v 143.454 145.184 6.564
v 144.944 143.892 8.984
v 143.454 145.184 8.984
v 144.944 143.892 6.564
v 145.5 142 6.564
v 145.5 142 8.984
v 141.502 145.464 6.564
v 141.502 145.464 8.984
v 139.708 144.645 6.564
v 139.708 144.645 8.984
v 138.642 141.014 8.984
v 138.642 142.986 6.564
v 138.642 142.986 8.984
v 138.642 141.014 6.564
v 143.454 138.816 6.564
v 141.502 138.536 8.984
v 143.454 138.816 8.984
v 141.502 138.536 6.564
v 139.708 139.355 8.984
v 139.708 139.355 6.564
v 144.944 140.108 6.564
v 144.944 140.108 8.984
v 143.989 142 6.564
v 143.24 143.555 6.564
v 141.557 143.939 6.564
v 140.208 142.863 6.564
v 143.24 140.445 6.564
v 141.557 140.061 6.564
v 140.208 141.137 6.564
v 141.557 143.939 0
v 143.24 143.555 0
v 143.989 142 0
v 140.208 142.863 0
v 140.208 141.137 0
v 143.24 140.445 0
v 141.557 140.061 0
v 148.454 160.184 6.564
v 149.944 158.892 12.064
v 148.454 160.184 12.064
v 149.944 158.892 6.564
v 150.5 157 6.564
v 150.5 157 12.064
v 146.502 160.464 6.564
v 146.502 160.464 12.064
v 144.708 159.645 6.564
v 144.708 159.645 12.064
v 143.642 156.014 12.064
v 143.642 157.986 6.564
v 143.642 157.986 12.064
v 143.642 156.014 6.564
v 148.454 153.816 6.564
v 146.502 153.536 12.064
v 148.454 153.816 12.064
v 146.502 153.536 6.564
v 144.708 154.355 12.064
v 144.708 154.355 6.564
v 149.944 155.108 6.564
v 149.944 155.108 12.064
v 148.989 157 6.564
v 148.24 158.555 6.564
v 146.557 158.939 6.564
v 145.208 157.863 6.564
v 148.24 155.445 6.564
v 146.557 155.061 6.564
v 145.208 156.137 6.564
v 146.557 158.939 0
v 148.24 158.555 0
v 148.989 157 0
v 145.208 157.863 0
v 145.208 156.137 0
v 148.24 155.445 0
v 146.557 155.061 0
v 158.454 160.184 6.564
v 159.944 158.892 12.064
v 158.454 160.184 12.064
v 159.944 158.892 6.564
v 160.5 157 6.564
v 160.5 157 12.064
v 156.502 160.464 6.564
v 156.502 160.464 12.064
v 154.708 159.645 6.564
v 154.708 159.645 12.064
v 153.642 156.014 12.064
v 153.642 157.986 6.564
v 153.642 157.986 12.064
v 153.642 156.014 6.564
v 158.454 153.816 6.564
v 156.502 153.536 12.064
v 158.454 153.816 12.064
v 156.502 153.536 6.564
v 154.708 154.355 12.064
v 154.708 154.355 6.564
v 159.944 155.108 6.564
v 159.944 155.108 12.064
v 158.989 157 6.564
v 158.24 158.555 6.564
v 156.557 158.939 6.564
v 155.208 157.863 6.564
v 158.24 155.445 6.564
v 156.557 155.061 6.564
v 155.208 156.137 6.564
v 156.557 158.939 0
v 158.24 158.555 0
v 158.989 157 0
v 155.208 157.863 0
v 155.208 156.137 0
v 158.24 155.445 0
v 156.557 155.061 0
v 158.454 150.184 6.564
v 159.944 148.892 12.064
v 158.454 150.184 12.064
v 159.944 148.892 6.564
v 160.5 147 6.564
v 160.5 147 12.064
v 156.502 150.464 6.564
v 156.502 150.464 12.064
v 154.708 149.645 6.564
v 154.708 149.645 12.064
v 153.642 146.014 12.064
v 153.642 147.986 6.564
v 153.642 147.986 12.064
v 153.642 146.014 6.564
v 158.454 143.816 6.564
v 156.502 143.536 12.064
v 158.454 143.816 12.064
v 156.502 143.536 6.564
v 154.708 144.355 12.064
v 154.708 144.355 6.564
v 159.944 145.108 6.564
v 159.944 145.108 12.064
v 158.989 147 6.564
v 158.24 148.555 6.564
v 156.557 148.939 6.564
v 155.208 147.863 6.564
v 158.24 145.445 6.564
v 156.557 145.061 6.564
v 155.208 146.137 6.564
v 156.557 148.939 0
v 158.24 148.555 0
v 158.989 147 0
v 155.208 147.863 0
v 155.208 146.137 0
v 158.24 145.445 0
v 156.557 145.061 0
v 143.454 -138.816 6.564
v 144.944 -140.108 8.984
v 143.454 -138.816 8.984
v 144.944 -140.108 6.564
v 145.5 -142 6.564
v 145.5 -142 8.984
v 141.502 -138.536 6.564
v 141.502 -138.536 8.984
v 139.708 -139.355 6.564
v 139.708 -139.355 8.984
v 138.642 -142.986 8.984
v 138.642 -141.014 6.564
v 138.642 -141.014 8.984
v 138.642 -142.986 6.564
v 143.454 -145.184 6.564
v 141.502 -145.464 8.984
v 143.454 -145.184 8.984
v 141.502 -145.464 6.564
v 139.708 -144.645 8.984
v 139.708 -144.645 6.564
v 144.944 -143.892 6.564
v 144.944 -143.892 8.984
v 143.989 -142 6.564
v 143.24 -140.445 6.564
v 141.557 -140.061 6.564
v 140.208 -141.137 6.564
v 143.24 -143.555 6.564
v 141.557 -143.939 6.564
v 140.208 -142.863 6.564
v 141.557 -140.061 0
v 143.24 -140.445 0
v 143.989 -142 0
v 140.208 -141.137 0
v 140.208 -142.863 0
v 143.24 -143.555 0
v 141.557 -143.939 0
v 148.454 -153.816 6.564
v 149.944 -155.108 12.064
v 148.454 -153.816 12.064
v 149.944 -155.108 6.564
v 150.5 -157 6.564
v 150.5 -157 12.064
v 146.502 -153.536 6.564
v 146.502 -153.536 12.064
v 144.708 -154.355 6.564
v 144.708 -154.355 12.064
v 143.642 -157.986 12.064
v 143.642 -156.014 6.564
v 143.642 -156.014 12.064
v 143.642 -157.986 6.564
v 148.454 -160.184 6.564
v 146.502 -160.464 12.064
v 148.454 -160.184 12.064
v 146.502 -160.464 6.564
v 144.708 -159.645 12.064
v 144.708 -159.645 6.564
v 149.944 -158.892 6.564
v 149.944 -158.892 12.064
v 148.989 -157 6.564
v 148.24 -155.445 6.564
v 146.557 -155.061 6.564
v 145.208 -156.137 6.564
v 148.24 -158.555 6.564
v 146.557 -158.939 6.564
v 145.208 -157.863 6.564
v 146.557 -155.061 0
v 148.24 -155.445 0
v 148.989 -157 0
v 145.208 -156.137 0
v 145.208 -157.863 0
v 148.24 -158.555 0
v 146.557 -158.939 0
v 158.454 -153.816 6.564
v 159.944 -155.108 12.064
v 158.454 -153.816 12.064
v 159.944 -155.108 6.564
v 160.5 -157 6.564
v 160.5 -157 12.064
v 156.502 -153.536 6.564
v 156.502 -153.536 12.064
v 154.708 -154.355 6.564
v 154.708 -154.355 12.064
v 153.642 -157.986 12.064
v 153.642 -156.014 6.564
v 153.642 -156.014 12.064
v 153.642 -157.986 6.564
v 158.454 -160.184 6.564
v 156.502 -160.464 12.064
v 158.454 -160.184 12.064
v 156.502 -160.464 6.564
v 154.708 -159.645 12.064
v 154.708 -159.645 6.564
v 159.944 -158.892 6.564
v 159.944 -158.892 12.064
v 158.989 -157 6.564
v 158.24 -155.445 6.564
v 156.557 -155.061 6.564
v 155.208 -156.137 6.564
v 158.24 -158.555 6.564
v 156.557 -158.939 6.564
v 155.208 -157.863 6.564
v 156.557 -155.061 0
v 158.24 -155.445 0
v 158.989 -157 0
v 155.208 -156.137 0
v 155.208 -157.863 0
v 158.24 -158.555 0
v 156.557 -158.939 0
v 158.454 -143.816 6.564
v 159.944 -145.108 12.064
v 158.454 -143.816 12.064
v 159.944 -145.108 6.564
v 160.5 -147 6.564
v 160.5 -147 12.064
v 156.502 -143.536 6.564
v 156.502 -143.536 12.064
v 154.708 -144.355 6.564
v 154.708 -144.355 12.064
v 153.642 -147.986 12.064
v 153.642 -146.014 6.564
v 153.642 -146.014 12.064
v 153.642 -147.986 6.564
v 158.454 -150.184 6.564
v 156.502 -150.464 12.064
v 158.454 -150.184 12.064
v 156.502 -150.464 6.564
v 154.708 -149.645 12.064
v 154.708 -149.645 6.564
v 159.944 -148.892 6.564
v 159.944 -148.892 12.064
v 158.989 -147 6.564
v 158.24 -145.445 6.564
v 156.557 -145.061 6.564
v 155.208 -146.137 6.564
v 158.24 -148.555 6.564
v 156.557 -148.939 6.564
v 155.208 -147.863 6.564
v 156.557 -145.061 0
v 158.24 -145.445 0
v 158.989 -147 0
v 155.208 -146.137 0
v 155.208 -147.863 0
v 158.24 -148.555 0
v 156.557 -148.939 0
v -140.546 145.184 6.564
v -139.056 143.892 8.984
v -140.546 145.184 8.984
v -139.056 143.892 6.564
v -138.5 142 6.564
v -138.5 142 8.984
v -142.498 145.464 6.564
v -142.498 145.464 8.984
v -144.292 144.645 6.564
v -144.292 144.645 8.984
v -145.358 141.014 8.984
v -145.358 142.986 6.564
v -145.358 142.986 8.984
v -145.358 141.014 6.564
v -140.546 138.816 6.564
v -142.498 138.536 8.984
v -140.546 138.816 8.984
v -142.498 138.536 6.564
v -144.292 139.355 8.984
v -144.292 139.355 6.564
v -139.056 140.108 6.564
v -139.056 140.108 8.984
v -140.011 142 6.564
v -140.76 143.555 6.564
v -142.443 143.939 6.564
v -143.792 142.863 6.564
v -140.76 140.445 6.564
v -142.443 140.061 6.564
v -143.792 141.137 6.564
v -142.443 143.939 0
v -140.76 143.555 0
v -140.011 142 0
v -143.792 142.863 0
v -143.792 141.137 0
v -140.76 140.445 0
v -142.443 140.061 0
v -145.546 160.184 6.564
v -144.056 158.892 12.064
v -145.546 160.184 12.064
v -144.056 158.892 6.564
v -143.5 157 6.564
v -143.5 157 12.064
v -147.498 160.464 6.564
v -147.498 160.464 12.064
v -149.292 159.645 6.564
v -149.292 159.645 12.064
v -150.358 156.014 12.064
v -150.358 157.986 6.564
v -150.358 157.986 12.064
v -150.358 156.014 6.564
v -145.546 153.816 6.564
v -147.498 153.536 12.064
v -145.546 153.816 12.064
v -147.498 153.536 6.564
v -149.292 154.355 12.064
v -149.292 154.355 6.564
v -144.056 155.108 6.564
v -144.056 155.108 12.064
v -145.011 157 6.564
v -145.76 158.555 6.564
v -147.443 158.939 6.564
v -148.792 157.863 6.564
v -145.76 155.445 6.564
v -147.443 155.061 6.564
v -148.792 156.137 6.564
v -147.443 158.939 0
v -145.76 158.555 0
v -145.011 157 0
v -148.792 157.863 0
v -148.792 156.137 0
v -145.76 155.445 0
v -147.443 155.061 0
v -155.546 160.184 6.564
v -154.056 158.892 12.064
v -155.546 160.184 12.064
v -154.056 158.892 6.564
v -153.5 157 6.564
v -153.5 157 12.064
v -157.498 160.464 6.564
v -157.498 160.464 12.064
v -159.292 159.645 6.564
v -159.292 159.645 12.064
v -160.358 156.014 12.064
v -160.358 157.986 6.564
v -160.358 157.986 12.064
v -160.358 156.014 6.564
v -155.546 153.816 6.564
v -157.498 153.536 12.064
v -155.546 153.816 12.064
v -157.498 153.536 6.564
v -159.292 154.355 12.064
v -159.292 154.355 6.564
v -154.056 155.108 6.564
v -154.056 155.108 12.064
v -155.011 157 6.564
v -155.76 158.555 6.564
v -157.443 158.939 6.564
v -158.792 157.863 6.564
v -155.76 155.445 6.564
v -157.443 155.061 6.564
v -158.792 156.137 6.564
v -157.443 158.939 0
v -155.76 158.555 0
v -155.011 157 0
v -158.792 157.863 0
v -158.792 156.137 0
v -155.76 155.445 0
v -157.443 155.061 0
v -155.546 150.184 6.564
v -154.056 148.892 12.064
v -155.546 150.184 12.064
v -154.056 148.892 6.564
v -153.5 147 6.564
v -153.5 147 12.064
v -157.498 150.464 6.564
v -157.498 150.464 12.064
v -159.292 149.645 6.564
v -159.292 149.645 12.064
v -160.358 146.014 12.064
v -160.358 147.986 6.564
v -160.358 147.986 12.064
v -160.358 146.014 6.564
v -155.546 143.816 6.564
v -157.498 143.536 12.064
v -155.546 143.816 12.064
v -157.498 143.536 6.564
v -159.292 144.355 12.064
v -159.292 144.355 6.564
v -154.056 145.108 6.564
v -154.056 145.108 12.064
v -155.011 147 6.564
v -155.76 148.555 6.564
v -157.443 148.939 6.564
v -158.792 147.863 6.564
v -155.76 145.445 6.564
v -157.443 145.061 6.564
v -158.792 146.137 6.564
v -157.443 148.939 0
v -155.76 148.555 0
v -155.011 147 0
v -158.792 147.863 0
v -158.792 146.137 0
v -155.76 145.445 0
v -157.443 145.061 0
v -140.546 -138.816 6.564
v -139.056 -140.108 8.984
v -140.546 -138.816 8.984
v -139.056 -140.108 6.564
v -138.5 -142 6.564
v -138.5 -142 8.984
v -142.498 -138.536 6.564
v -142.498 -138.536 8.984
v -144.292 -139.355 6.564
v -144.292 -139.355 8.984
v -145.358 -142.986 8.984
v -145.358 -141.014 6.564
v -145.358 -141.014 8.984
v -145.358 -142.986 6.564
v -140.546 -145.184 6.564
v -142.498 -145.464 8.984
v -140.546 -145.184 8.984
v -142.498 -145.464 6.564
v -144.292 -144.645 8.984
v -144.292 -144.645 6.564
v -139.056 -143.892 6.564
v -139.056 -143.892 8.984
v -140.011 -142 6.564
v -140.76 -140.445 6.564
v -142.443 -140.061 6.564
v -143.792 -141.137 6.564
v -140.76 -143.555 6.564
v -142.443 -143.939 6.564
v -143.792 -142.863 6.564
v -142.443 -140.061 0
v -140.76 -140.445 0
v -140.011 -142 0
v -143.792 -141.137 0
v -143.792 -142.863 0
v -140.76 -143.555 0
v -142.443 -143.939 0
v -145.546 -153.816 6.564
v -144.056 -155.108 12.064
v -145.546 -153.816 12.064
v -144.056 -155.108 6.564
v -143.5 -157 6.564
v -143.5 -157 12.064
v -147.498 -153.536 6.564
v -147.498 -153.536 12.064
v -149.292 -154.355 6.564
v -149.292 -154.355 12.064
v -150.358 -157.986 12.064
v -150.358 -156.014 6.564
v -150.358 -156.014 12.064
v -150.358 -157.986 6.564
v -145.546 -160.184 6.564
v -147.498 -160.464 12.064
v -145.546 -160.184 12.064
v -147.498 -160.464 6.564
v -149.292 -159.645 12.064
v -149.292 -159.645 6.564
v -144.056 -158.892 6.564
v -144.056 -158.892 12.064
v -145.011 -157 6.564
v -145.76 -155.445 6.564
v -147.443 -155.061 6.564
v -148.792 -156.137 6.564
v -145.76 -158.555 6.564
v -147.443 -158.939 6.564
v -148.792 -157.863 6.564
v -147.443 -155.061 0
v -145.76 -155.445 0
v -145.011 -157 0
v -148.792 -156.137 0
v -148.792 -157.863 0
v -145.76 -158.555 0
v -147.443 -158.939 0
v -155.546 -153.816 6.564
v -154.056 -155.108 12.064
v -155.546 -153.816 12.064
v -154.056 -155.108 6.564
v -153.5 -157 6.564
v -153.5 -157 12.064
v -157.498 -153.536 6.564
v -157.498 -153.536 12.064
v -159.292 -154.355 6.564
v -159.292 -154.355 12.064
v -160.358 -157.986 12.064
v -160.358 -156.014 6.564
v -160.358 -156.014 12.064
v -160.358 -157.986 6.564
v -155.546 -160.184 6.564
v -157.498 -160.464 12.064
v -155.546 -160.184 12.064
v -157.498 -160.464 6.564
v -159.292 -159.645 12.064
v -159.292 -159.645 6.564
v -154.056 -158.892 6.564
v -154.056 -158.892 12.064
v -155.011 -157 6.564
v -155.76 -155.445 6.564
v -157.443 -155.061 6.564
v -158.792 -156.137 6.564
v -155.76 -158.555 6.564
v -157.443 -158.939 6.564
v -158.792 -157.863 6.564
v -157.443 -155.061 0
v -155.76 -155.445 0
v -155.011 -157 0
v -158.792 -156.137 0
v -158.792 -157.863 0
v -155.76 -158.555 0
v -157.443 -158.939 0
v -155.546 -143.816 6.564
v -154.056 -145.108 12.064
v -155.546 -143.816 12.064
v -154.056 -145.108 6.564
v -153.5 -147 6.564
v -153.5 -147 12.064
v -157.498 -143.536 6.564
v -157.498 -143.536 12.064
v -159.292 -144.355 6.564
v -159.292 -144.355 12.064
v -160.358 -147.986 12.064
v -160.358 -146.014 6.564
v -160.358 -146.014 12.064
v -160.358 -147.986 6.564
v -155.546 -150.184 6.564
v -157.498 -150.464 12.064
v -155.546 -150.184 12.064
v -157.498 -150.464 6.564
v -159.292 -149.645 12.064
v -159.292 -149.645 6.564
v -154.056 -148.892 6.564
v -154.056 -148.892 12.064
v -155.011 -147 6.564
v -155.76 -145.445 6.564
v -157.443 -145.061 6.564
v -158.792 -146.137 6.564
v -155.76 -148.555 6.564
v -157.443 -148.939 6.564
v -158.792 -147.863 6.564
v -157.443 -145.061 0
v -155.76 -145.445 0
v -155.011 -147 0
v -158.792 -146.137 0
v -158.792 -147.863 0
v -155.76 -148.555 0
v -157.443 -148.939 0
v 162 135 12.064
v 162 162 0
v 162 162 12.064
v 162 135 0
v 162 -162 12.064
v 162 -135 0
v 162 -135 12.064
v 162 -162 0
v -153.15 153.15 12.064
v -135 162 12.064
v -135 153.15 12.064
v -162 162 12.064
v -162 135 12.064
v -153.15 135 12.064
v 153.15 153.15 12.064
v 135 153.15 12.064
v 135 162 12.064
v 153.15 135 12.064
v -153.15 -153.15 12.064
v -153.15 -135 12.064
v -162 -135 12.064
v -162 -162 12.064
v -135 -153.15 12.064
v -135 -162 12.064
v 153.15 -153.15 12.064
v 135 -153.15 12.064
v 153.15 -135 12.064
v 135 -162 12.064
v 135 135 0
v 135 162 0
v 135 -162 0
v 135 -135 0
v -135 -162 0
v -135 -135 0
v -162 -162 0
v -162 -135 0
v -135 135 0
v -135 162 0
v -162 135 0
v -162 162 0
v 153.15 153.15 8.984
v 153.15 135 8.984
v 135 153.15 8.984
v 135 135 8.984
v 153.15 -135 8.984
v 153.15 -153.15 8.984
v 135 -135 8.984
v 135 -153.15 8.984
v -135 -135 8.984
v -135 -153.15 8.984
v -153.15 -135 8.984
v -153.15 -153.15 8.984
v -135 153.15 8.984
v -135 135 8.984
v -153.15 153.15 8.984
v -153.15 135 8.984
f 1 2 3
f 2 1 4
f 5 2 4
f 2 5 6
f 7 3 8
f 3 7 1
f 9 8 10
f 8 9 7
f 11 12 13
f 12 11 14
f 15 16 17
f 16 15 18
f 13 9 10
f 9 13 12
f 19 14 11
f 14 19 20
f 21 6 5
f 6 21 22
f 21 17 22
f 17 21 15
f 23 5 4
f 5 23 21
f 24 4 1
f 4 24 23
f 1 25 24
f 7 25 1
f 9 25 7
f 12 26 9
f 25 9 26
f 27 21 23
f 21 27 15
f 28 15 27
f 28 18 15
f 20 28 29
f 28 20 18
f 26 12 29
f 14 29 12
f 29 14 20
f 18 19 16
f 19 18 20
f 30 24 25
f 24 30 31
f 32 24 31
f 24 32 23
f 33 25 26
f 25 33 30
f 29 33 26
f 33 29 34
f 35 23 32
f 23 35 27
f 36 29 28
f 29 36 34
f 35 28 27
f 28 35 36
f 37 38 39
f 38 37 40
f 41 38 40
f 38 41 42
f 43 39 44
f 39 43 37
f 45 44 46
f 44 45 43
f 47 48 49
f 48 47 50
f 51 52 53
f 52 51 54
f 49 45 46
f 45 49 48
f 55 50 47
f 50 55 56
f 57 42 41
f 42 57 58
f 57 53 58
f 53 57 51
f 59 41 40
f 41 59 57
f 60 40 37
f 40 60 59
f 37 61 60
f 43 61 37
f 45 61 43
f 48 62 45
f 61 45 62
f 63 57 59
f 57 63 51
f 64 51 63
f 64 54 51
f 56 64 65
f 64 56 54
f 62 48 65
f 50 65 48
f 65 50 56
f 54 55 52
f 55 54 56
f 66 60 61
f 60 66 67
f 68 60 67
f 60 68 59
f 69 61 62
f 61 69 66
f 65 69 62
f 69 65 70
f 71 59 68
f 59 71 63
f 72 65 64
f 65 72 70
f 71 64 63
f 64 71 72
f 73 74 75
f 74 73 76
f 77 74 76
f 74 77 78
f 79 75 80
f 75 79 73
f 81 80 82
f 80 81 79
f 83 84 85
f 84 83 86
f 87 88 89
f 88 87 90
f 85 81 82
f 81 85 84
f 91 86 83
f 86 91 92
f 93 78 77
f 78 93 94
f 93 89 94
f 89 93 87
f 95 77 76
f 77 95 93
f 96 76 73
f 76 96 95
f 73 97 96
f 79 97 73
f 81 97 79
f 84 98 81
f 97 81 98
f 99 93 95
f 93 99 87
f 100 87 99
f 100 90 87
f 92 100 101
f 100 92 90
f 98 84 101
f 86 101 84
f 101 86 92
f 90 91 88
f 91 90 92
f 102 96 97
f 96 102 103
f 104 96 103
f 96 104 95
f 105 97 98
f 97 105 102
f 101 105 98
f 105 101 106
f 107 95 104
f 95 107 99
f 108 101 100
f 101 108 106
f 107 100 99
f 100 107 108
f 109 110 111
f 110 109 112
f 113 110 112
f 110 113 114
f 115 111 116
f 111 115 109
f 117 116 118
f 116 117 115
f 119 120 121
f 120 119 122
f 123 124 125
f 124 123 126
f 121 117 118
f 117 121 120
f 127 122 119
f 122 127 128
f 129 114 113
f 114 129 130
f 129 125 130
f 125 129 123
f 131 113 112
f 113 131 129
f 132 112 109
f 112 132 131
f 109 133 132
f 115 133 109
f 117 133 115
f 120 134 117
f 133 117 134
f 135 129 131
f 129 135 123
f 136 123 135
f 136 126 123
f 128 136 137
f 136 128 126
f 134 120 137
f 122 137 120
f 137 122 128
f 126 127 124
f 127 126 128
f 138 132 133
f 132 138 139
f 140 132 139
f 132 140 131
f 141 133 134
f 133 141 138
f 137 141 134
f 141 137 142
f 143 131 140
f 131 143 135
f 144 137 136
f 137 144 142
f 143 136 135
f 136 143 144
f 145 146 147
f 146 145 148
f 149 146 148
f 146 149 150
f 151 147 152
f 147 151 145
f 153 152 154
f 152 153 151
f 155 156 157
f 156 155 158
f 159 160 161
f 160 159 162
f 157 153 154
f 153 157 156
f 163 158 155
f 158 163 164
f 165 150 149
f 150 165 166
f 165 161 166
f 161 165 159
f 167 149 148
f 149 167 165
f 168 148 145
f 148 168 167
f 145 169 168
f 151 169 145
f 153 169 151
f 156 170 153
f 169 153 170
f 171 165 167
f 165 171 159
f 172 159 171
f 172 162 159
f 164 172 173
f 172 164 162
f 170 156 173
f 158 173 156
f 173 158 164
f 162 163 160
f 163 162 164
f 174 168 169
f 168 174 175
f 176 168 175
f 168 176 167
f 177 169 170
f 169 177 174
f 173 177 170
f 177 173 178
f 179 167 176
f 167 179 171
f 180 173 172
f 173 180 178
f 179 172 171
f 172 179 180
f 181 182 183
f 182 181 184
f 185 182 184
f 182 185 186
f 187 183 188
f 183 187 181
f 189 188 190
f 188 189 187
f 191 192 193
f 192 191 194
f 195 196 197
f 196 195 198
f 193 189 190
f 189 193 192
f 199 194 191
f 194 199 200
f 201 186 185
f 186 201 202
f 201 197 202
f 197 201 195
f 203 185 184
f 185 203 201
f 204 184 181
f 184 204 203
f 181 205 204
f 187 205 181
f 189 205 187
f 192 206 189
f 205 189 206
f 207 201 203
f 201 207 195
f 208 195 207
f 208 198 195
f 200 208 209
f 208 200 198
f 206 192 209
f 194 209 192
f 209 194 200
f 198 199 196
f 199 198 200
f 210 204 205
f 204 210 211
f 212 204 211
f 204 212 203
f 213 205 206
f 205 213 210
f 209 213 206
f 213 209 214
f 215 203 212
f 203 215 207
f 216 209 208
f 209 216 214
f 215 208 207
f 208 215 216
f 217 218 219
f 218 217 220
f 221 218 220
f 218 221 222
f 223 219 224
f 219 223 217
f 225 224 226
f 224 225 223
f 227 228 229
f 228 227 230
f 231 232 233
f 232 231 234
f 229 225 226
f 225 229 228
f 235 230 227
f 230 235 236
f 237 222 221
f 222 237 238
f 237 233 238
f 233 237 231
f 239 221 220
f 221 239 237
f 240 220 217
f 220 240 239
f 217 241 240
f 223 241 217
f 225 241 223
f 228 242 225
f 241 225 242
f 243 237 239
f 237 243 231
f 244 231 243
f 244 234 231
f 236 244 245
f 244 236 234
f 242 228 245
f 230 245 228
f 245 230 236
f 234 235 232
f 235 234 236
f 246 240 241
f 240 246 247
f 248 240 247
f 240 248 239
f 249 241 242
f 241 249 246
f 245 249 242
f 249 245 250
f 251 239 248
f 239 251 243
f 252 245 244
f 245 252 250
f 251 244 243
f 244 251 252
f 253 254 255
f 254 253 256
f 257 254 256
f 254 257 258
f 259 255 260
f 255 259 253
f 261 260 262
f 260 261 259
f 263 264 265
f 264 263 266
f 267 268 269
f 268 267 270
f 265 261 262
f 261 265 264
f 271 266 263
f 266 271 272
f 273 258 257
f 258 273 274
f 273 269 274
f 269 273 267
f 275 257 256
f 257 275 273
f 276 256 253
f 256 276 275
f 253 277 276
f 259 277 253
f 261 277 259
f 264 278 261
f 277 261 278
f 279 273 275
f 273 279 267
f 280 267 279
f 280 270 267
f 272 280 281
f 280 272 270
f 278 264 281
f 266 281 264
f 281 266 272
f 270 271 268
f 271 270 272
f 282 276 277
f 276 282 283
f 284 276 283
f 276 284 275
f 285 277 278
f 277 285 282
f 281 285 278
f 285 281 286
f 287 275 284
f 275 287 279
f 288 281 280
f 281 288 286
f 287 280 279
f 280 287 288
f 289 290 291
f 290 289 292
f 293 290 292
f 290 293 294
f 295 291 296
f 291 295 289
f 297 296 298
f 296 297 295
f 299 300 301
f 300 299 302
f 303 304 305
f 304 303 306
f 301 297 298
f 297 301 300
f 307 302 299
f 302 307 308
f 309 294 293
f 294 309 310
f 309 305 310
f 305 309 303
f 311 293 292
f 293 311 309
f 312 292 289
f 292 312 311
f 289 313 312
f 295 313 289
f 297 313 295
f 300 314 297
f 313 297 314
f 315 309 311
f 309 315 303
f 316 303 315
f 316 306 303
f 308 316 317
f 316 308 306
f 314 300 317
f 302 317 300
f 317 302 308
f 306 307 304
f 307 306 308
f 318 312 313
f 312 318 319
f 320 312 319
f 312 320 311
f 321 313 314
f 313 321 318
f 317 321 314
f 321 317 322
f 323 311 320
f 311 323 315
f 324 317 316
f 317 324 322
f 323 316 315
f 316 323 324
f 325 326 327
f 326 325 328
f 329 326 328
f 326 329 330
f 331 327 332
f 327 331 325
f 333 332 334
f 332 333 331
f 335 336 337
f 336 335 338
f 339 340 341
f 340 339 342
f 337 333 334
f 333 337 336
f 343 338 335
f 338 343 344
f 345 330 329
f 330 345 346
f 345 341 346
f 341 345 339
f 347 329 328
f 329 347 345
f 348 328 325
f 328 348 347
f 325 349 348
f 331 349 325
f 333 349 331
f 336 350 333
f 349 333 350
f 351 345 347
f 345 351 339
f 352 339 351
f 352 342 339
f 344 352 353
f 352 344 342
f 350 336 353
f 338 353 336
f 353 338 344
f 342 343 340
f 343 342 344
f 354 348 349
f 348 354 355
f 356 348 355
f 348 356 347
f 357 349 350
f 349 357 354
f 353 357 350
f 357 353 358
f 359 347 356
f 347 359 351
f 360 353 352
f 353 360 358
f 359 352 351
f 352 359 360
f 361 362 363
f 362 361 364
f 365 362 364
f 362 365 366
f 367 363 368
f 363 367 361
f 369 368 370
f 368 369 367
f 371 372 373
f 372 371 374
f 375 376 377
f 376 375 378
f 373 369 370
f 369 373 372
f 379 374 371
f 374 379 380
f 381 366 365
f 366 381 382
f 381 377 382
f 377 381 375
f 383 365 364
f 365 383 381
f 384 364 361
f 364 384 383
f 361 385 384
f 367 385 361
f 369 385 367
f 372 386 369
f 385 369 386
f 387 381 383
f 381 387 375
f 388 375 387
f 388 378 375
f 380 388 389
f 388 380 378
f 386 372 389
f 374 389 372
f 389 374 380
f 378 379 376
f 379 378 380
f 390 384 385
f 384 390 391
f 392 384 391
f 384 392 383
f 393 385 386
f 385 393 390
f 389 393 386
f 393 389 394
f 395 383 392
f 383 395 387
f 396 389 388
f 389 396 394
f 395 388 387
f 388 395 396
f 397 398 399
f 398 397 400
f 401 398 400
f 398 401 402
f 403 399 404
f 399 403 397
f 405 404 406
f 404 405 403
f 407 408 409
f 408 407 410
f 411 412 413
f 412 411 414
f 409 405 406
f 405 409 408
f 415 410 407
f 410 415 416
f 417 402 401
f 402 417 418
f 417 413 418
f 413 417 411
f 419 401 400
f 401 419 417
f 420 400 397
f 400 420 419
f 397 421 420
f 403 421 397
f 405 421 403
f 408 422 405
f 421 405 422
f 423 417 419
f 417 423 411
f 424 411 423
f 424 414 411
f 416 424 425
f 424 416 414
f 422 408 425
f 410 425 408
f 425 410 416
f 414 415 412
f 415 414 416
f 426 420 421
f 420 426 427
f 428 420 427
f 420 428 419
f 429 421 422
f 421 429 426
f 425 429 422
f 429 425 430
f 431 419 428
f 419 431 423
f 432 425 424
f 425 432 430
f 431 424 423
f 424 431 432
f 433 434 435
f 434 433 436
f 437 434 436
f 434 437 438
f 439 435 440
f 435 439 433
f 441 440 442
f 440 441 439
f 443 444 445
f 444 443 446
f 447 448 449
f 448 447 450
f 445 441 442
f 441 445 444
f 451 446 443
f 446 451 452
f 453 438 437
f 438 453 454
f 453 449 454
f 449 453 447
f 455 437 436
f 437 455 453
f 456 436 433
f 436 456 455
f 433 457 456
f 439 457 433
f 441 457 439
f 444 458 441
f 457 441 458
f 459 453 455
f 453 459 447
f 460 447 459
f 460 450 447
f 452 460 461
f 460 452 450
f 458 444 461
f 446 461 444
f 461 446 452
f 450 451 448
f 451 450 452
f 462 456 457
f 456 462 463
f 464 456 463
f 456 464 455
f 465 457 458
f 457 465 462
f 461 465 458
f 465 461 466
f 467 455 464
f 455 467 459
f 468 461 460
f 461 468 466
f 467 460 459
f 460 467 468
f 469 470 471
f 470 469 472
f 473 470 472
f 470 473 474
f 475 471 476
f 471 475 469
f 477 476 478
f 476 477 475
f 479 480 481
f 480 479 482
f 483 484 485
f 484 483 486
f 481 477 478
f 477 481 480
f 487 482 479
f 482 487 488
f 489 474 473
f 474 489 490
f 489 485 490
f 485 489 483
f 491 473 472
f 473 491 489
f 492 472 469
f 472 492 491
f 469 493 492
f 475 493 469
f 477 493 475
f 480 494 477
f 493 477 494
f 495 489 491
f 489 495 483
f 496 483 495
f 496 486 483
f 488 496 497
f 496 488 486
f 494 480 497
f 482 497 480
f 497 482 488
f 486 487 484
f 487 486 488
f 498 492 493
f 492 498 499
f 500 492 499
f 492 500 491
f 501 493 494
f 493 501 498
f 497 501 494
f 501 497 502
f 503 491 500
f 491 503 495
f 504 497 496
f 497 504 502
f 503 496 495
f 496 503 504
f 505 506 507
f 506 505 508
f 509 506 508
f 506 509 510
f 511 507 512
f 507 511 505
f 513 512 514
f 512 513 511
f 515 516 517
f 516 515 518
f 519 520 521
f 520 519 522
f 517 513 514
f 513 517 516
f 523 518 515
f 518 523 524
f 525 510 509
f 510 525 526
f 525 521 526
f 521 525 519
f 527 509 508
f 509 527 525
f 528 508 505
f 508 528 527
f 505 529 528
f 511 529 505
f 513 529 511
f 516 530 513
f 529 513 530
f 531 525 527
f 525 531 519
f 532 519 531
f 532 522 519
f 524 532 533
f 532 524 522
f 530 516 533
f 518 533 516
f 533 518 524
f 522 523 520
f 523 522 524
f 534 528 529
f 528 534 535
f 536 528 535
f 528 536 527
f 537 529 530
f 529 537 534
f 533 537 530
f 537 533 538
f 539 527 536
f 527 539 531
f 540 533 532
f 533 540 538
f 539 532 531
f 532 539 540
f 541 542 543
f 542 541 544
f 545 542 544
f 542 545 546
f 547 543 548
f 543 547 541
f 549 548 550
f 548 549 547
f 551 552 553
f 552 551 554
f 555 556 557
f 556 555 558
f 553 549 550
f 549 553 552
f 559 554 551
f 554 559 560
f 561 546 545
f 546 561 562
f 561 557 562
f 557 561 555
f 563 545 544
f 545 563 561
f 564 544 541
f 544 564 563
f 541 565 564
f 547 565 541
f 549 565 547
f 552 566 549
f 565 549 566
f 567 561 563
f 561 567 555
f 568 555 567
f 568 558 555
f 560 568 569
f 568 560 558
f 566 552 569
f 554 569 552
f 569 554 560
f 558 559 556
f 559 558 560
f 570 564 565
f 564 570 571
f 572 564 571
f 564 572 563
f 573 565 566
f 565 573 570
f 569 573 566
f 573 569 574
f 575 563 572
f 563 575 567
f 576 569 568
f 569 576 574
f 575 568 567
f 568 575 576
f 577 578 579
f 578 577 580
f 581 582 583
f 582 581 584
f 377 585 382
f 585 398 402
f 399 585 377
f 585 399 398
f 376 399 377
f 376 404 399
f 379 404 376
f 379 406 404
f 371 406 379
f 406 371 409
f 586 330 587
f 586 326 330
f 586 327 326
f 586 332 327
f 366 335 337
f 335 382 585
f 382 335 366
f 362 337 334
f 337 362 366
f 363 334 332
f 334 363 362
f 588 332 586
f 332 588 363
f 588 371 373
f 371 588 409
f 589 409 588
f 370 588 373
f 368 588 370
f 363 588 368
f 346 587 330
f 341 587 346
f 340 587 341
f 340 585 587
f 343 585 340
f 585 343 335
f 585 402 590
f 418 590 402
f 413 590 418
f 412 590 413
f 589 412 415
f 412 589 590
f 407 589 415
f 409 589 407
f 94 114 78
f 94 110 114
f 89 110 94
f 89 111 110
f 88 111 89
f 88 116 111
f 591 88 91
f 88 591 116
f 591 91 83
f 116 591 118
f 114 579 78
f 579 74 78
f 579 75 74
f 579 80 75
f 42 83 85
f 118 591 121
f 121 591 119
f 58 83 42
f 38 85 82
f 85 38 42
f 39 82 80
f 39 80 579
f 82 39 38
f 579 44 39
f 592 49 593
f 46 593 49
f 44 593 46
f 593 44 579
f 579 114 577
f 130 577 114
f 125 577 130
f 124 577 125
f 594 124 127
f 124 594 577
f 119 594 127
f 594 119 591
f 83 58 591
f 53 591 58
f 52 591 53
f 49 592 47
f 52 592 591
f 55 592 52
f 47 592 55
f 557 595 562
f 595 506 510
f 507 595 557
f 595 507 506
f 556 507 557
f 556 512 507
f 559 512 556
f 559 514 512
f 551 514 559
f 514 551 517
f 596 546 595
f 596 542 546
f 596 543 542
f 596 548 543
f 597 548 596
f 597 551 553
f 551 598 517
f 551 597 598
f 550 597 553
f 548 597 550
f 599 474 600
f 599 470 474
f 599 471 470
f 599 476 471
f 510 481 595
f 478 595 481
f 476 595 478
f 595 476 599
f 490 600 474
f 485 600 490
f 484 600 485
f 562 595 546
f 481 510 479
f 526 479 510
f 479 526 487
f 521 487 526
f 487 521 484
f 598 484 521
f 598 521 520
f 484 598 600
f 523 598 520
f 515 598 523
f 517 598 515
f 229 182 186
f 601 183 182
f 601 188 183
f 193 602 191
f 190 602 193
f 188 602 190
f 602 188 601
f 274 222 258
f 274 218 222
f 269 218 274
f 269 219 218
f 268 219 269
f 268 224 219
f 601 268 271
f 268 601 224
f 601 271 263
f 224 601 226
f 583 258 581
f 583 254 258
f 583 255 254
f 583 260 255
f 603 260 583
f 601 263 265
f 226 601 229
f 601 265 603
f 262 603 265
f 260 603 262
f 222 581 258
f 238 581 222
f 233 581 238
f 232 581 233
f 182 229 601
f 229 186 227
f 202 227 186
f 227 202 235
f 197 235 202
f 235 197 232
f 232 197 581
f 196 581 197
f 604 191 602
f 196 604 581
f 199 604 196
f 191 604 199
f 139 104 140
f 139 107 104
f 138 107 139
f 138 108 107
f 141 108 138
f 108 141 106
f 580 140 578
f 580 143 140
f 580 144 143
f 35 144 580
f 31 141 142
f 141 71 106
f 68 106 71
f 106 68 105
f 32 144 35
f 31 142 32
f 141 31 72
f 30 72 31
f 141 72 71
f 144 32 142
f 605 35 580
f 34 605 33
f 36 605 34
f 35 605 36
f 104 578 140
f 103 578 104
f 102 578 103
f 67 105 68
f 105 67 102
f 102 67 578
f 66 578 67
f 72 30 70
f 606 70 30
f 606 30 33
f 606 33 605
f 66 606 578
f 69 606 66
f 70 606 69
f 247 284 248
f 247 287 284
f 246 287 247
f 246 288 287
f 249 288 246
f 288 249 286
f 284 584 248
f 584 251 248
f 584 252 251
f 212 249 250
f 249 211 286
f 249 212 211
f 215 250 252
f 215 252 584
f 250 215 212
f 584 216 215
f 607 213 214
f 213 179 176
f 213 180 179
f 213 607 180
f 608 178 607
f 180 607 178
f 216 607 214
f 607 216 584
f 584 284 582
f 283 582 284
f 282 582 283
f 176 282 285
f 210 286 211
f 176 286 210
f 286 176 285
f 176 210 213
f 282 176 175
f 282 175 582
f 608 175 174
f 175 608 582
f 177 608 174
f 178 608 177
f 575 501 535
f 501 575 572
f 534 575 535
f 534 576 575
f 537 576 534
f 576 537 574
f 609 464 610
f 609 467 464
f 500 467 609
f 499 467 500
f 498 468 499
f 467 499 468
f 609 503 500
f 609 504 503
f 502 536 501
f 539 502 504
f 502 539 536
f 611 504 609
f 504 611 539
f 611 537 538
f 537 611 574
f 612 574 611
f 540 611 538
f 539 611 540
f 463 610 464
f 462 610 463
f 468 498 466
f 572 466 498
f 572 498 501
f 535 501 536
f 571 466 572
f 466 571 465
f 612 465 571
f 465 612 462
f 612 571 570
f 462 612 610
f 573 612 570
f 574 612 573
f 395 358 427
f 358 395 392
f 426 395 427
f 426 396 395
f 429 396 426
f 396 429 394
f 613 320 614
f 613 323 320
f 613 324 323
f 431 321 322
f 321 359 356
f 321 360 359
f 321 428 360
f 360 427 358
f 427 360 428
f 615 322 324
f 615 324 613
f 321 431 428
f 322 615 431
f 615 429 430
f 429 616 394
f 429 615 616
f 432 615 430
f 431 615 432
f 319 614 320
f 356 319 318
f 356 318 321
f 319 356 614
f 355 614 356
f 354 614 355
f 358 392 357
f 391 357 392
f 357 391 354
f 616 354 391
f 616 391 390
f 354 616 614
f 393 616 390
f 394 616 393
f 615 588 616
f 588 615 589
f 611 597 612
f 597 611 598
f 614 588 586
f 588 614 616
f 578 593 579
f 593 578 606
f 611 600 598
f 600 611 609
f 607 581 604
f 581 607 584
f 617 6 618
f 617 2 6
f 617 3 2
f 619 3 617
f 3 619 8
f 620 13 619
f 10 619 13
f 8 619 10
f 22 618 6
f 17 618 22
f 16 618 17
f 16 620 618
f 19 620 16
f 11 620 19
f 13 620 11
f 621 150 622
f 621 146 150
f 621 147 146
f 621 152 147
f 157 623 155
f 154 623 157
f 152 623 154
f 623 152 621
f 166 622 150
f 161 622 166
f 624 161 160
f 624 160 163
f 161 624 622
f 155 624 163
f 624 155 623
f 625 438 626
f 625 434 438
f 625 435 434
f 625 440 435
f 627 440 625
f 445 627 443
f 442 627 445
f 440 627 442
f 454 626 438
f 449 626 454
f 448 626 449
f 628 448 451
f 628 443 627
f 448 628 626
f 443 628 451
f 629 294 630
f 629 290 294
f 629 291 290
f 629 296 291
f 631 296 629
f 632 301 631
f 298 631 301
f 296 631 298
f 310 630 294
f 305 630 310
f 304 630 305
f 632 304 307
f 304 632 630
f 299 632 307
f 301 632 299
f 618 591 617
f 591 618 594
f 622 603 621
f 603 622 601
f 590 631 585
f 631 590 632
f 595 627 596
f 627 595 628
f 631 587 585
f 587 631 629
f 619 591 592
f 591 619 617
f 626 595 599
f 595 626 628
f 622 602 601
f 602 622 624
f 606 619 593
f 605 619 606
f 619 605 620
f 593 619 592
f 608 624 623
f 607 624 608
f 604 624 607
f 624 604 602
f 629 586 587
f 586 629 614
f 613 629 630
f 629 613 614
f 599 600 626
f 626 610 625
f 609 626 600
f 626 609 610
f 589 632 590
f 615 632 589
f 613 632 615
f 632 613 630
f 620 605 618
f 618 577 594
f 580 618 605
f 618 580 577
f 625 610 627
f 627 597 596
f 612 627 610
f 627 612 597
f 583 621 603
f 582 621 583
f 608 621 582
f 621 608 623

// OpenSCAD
use<MCAD/nuts_and_bolts.scad>
holes = [[142,142],[147,157],[157,157],[157,147] ];



//spreader=[0.4+12*25.4,0.4+9*25.4,3];
spreader=[0,0,0];
glass=[1.5+12*25.4,1.5+12*25.4,3.08];
cork=[12*25.4,12*25.4,3];
screws_offset=(5/64)*25.4 + 3;
heater=[225,225,1];
cork_plane = [cork[0],cork[1],cork[2]+screws_offset];

*color("red")translate([0,0,heater[2]/2 + cork_plane[2]])cube(heater,center=true);
*color("blue")translate([0,0,heater[2]+spreader[2]/2 + cork_plane[2]])cube(spreader,center=true);
*color("yellow")translate([0,0,heater[2]+glass[2]/2+ spreader[2] + cork_plane[2]])cube(glass,center=true);

bracket = [162*2,162*2,cork_plane[2]+heater[2]+glass[2]+spreader[2]];
cutout=1.2;

// corner mounting holes
difference() {
  translate([0,0,bracket[2]/2])cube(bracket,center=true);
for (k = [1,-1])
  for (j = [1,-1]) 
    for (i = holes) {
      mirror([0,0,1])translate([k*i[0],j*i[1],-bracket[2]+5.5])boltHole(size=4, length=bracket[2]);
      mirror([0,0,1])translate([k*i[0],j*i[1],-bracket[2]+3])boltHole(size=4, length=bracket[2]);
//      *cylinder(r=3.2/2, h=bracket[2]+5);
    }
color("red")translate([0,0,heater[2]/2 + cork_plane[2]])cube(heater,center=true);
color("blue")translate([0,0,heater[2]+spreader[2]/2 + cork_plane[2]])cube(spreader,center=true);
color("yellow")translate([0,0,heater[2]+glass[2]/2+ spreader[2] + cork_plane[2]])cube(glass,center=true);
color("green") translate([0,0,bracket[2]/2])cube([bracket[0]/cutout,bracket[1],bracket[2]],center=true);
color("green") translate([0,0,bracket[2]/2])cube([bracket[0],bracket[1]/cutout,bracket[2]],center=true);

}
